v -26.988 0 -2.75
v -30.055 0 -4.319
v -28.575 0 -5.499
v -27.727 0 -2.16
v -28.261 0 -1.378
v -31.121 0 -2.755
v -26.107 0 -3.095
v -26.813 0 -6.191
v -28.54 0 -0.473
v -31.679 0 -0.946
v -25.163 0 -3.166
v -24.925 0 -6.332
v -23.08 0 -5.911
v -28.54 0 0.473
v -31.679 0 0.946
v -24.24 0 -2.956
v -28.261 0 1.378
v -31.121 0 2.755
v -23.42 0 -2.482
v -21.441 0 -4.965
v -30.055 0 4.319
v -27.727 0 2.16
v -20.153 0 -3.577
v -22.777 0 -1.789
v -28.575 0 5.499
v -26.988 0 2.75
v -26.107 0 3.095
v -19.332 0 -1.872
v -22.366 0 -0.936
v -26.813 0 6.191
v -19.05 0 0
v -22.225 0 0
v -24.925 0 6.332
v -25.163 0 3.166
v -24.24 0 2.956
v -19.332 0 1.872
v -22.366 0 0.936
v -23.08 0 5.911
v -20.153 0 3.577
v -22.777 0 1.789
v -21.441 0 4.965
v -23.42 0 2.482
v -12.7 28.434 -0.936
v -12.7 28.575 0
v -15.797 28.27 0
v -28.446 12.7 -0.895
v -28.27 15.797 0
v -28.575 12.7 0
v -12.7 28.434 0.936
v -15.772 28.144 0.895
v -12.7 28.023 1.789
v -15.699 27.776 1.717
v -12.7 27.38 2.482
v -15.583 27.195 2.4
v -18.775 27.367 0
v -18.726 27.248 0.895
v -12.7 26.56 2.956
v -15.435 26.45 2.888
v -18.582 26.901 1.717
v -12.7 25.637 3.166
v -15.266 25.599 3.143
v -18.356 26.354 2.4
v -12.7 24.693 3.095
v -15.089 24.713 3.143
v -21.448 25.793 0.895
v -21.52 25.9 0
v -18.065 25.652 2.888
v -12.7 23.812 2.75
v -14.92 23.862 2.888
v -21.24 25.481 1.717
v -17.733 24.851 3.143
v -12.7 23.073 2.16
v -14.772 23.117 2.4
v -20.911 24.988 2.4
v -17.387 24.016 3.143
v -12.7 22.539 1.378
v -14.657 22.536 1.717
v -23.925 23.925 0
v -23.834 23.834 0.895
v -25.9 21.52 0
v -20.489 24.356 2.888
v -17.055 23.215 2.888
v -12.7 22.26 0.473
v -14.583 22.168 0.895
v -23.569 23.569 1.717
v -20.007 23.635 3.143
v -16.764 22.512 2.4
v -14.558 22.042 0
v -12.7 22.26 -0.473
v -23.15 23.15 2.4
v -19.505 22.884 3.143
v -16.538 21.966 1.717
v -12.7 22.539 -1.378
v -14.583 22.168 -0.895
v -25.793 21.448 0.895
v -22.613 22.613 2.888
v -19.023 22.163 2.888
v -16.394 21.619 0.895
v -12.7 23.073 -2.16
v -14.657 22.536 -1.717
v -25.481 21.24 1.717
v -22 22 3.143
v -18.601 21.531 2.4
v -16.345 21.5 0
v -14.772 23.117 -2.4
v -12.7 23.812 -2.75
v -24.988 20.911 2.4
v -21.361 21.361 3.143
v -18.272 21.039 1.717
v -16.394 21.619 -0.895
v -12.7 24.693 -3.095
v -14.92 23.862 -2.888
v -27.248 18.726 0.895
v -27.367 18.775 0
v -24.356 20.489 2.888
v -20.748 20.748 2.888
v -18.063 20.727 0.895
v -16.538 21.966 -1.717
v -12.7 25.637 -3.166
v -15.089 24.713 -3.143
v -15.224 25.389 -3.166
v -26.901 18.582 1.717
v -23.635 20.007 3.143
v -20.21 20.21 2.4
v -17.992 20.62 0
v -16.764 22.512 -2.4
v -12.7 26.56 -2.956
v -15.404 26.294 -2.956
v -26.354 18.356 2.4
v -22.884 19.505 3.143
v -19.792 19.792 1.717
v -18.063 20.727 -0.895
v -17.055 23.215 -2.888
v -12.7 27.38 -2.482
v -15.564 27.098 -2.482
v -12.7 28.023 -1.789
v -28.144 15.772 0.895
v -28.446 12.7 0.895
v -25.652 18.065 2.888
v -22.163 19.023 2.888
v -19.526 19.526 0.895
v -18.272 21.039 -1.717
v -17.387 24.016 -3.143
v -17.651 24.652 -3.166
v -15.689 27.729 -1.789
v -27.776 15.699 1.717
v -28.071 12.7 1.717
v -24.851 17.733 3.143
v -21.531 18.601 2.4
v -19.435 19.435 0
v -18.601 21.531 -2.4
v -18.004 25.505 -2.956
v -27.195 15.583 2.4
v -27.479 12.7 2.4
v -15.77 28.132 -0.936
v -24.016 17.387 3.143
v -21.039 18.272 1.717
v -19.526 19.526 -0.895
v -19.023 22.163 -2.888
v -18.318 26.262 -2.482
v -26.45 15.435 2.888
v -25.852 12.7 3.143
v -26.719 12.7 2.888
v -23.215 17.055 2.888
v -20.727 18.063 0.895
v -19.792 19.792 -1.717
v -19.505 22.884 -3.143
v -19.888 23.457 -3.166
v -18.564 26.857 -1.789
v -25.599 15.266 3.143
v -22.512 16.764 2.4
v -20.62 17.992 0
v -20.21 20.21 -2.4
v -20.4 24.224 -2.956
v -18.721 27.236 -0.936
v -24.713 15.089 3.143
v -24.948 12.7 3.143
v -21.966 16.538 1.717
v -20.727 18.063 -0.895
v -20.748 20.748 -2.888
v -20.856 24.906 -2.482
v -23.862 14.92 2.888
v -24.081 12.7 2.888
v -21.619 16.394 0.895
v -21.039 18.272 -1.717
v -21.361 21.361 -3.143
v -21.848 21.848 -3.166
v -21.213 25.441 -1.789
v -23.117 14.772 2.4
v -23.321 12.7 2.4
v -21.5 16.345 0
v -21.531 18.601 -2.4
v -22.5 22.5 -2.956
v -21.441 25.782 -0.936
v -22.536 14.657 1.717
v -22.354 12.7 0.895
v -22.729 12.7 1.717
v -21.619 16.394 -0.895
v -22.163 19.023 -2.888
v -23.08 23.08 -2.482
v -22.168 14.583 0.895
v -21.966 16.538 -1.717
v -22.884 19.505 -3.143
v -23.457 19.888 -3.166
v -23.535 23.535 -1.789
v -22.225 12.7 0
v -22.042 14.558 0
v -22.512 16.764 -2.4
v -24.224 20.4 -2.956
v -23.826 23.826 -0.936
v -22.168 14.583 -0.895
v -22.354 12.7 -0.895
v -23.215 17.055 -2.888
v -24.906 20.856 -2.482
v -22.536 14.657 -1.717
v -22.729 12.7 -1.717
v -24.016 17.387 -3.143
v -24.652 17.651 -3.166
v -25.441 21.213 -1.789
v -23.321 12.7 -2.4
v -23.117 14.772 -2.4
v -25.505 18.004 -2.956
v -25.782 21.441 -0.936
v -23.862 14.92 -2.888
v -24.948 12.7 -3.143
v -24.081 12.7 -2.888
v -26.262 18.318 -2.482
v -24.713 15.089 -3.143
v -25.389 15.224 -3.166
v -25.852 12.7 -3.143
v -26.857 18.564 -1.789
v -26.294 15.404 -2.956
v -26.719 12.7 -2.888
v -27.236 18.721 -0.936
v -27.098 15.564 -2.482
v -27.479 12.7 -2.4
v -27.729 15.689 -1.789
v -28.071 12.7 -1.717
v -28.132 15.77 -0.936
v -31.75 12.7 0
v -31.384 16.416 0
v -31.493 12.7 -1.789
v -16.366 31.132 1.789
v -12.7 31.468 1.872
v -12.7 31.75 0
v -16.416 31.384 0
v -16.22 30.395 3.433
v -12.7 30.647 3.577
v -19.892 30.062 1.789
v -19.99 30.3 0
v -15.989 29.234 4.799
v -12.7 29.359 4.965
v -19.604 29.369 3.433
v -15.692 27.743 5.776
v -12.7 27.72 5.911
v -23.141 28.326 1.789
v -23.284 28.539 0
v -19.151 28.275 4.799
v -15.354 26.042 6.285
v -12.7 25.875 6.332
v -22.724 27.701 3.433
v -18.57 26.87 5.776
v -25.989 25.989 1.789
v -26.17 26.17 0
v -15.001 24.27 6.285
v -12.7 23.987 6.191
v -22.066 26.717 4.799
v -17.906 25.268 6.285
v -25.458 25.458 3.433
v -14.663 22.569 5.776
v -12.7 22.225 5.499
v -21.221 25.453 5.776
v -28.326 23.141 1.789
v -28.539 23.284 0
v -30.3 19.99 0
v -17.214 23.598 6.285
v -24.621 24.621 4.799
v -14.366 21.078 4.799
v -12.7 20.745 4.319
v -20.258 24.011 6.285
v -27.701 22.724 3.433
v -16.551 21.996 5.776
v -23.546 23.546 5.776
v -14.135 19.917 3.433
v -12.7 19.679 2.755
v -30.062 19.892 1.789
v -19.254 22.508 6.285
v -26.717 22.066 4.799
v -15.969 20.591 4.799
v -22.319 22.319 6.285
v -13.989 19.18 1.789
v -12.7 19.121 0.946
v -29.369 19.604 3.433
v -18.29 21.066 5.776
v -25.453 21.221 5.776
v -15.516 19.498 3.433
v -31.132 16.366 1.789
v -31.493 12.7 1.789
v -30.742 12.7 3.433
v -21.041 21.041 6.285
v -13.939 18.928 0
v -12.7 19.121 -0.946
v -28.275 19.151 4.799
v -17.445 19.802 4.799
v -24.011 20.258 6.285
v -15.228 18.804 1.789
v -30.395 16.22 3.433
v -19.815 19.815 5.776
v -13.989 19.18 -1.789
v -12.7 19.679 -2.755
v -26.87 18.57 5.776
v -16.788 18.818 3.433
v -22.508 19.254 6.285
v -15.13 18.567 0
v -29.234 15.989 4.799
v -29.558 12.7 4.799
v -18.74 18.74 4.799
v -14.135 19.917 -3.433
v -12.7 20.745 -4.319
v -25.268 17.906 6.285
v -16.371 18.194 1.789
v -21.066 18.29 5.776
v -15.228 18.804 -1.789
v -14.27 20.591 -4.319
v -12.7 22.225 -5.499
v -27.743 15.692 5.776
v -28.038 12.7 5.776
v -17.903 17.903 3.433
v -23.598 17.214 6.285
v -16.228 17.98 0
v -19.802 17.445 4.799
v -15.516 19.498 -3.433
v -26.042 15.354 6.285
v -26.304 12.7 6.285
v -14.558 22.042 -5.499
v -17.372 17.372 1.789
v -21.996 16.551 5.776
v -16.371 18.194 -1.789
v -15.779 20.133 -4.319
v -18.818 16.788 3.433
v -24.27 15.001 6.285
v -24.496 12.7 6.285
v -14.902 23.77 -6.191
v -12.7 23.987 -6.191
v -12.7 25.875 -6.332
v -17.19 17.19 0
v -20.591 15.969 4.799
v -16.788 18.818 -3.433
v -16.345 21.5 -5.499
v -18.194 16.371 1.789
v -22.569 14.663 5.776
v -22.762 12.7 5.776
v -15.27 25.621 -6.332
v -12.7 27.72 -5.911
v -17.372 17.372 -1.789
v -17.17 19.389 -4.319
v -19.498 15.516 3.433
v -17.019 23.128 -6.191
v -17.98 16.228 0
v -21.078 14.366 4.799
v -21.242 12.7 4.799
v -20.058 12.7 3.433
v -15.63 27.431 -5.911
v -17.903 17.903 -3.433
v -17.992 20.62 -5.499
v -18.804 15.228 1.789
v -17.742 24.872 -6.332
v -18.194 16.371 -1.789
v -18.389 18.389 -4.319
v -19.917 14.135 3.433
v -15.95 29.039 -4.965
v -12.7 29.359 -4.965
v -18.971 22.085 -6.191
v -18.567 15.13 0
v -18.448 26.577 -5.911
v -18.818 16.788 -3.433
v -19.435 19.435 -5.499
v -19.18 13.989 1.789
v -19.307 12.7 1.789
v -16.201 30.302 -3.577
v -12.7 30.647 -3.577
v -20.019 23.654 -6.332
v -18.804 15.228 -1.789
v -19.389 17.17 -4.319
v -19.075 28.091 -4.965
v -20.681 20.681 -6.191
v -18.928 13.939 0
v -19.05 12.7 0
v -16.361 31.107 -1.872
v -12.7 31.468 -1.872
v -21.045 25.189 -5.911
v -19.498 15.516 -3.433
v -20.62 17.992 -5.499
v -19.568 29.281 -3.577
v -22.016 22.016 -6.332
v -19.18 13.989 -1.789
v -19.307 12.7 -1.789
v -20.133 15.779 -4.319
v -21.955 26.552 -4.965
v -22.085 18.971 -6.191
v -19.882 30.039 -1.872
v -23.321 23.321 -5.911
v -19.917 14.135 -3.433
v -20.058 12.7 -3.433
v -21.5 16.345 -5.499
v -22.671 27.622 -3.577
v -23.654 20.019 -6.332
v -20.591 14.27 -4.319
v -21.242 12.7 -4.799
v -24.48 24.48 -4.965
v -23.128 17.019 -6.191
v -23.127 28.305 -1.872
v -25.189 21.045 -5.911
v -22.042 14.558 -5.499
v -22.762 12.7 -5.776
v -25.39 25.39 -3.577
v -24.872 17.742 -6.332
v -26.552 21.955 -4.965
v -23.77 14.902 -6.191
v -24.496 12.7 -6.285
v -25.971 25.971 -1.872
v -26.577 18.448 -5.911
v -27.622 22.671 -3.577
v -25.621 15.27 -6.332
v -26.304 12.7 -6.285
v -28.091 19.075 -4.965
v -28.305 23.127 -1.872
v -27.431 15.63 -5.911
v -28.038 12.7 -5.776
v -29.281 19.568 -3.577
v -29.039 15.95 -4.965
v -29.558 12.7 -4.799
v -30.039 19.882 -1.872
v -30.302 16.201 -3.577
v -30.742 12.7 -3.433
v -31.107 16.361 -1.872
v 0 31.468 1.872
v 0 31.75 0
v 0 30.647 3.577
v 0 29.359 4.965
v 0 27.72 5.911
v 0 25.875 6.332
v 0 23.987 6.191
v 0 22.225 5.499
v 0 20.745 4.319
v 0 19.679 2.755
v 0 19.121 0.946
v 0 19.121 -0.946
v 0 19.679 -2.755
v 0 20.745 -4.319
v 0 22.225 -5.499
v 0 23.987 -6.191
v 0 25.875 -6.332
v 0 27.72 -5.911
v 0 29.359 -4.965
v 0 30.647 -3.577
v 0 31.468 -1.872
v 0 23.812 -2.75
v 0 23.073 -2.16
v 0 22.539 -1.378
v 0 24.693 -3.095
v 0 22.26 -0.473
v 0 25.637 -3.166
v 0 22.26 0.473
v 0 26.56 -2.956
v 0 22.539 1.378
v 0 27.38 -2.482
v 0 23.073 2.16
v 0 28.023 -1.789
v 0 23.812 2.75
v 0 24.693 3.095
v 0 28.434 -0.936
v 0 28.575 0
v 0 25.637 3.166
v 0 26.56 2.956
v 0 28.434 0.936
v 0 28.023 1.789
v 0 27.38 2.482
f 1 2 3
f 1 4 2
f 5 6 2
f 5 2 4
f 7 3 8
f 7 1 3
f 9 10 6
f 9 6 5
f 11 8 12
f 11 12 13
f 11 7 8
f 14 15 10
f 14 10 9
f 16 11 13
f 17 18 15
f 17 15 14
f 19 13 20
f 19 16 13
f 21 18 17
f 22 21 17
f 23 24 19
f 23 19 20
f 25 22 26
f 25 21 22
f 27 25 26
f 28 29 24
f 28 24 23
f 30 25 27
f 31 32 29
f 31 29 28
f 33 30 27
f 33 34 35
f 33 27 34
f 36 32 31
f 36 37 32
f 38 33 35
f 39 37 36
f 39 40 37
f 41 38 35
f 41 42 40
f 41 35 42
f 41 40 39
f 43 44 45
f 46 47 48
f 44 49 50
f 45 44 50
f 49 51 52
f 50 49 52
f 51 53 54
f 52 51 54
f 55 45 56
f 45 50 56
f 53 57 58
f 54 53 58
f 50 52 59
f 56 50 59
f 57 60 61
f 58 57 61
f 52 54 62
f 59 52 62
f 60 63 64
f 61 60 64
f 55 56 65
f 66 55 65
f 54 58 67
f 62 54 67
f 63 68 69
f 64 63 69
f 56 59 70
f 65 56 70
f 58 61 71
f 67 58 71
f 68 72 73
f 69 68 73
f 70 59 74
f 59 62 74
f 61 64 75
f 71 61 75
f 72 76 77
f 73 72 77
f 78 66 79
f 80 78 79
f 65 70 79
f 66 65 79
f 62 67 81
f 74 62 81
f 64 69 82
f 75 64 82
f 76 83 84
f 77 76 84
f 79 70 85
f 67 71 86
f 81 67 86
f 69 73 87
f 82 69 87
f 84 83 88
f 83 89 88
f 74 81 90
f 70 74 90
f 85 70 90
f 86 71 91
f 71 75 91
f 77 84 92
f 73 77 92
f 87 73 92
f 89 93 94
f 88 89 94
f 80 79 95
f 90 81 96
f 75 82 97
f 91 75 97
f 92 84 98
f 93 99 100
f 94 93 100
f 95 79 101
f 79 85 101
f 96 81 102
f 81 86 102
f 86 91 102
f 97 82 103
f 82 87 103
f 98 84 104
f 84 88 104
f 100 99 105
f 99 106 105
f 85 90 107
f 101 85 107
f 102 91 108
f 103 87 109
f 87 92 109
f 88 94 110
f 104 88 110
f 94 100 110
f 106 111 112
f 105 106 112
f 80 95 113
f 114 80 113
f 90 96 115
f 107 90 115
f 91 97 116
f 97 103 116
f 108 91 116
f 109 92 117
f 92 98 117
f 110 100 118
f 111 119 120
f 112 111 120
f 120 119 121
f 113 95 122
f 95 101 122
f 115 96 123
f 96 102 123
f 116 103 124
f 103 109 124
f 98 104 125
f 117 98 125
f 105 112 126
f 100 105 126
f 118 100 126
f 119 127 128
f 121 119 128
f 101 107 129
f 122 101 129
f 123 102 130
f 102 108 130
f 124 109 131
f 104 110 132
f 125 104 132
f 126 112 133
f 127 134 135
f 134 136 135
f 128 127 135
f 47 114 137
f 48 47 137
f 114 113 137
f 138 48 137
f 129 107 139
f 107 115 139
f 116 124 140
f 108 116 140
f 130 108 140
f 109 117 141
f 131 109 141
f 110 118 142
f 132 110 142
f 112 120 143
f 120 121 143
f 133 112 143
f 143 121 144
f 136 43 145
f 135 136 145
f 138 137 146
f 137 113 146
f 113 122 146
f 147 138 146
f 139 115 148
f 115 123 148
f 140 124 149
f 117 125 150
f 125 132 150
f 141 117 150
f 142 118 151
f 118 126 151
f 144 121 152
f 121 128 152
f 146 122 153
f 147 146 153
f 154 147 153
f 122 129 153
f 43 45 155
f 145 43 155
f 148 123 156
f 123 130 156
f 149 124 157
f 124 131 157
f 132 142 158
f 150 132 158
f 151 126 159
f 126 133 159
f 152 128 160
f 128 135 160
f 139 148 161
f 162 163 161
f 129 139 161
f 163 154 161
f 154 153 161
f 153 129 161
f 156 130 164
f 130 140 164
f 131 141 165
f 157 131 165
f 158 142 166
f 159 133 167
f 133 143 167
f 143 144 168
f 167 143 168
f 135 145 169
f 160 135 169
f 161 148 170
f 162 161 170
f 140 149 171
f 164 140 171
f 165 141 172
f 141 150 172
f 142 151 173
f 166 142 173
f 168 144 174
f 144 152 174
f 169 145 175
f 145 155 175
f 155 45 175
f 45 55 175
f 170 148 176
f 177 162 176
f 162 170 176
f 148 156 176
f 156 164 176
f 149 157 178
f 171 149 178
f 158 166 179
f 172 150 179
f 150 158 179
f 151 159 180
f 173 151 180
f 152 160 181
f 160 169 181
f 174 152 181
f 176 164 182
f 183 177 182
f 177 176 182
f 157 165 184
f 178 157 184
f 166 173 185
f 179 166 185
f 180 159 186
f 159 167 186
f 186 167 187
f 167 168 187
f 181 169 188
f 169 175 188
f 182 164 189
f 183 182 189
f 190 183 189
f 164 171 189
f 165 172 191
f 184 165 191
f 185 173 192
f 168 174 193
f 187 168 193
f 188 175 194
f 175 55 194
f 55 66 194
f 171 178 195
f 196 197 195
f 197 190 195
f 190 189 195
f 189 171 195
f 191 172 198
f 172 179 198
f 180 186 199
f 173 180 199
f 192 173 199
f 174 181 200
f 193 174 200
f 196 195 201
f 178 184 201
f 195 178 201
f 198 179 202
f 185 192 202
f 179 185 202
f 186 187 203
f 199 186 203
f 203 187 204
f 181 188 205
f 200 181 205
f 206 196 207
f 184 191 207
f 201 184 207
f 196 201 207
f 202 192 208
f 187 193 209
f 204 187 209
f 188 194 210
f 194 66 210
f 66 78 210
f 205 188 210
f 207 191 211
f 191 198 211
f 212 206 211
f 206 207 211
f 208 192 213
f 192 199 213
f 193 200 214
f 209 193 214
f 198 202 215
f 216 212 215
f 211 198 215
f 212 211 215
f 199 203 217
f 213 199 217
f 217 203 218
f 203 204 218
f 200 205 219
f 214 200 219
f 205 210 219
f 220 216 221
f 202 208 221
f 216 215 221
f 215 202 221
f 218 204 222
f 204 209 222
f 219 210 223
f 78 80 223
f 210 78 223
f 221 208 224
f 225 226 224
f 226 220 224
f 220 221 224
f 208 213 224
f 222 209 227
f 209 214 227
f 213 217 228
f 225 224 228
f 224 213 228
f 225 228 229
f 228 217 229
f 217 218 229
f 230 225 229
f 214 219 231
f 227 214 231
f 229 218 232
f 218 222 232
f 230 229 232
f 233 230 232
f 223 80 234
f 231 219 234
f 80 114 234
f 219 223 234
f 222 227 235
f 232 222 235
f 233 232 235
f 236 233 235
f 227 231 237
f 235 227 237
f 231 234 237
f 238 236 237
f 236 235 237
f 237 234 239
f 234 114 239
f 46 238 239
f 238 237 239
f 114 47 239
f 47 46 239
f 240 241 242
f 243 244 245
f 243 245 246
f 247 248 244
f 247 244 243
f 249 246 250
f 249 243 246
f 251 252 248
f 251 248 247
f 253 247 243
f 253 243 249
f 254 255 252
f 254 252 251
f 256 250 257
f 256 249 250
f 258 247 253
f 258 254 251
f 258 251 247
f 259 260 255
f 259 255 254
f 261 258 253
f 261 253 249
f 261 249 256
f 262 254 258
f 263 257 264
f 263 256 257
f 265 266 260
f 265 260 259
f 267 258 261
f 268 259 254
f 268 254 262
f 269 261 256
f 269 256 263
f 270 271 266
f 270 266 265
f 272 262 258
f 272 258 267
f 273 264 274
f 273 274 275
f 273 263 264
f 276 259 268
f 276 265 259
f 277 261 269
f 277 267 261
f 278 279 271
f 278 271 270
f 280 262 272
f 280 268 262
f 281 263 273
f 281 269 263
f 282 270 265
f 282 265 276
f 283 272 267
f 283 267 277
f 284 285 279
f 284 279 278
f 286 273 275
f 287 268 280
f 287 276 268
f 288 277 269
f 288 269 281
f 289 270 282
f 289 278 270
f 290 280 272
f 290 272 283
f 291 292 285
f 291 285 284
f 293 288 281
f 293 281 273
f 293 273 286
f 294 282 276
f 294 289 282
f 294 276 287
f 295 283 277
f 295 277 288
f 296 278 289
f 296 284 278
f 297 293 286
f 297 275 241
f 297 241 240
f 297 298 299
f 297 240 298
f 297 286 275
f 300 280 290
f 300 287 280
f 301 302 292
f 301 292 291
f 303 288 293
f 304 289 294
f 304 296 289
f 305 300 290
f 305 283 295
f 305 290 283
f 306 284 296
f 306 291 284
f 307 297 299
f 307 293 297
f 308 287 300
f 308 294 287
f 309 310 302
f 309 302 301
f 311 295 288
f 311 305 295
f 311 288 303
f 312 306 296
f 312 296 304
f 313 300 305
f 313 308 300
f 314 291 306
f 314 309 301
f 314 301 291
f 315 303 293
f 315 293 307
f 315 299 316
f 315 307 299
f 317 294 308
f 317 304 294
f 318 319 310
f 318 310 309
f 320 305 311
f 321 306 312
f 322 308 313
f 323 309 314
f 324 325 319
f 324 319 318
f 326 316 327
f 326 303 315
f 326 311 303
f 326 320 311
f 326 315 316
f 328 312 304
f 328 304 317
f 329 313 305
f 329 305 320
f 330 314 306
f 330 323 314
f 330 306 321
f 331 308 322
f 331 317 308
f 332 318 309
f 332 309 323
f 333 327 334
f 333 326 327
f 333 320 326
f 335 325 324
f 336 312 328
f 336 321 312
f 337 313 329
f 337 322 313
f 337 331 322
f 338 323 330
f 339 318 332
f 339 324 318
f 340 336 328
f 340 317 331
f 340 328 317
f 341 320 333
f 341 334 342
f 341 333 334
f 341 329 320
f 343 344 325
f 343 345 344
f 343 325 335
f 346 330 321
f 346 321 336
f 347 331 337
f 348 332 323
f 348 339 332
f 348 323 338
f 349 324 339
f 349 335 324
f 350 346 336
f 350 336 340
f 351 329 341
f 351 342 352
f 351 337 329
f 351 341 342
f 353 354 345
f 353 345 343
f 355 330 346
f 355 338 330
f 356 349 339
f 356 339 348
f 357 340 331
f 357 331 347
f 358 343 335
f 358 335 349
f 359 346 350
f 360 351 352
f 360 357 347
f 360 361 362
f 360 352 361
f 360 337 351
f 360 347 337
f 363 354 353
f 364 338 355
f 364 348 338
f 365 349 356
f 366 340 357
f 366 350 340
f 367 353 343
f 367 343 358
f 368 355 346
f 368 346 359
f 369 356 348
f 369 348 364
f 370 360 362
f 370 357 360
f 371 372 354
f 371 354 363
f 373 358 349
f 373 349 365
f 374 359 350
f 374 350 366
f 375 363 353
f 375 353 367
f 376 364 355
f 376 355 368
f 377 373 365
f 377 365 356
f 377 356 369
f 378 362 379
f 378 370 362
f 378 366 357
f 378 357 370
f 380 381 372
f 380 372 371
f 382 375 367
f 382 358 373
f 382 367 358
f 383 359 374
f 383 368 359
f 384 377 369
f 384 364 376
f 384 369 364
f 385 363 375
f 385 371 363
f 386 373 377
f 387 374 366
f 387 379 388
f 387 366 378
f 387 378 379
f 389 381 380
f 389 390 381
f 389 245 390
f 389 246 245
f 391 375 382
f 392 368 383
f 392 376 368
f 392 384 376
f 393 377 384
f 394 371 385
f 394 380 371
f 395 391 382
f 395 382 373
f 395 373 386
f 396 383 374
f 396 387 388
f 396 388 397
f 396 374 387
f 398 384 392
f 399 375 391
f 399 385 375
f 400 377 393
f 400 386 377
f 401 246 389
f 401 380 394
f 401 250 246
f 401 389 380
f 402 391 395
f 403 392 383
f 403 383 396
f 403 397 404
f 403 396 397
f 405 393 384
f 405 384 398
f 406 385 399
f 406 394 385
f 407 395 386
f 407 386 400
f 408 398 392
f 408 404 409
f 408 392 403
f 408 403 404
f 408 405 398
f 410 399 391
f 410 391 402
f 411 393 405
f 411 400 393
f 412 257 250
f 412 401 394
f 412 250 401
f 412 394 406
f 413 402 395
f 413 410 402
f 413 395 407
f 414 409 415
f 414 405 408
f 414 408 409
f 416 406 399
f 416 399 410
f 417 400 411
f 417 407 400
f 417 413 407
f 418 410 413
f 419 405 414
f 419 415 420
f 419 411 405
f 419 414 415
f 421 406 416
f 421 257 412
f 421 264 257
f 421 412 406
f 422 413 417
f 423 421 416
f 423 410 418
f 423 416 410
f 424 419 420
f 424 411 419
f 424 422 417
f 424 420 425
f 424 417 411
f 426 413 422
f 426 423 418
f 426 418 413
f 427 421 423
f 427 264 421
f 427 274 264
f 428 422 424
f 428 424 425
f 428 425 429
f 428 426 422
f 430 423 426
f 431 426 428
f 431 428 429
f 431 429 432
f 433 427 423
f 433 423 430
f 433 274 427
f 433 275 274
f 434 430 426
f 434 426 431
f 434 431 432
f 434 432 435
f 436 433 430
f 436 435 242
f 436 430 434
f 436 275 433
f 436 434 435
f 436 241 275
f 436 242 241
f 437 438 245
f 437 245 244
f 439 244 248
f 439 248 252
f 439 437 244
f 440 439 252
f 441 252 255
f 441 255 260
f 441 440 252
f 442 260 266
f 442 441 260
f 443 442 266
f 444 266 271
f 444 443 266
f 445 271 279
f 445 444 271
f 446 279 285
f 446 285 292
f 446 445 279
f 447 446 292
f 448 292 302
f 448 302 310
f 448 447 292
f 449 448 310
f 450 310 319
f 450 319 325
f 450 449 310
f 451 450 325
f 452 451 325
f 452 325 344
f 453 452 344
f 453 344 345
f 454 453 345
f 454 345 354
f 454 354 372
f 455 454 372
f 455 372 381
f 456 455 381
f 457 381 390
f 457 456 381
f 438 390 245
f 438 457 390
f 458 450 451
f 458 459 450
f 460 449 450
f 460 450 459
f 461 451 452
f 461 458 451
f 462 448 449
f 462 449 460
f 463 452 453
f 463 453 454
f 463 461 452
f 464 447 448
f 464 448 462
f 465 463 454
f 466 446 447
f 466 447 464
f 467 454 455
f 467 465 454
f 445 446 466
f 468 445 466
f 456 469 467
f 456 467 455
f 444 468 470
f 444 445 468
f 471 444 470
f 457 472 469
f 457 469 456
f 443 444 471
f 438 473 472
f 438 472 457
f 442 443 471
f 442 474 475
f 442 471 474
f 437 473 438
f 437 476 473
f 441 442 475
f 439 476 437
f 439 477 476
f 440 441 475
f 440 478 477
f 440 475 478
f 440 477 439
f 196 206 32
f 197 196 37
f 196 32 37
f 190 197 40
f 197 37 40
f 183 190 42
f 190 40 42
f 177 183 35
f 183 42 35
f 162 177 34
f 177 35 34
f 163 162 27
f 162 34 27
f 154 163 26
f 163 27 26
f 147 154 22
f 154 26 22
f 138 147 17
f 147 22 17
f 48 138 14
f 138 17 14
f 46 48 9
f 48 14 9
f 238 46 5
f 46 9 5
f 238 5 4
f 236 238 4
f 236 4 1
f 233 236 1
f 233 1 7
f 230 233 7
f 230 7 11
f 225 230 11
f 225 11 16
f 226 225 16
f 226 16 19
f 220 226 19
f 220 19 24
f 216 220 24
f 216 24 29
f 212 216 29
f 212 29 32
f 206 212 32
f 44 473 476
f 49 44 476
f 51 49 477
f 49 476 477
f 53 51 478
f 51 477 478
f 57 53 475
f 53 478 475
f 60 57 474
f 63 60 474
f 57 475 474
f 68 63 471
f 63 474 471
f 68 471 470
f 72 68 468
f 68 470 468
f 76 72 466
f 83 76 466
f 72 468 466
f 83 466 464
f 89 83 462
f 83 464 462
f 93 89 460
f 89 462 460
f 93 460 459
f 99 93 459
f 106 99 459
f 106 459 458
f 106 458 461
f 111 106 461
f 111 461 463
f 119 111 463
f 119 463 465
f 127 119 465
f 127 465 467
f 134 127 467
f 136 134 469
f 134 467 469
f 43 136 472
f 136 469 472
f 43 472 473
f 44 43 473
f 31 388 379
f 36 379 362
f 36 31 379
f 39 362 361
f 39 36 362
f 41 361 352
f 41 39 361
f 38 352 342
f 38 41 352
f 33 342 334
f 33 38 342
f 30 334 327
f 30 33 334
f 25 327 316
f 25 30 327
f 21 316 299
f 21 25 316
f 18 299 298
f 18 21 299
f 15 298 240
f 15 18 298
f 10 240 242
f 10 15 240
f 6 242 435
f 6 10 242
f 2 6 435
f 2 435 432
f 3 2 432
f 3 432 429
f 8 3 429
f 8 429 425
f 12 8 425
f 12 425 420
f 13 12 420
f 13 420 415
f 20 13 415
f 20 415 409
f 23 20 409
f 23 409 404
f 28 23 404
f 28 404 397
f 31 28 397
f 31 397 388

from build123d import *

# Parameters (mm, degrees)
F0_R        = 6.35
F0_R_2      = 3.175
F1_DEPTH    = 12.7
F2_R        = 6.35
F2_R_2      = 3.175
F3_DEPTH    = 12.7
F1_FACE_R   = 6.35
F1_FACE_R_2 = 3.175


with BuildPart() as f1:
    # F0 (on Right) → F1 (new body)
    with BuildSketch(Plane.YZ):
        with Locations((25.4, 0)):
            Circle(F0_R)
        with Locations((25.4, 0)):
            Circle(F0_R_2, mode=Mode.SUBTRACT)
    extrude(amount=-F1_DEPTH)



with BuildPart() as f3:
    # F2 (on Front) → F3 (new body)
    with BuildSketch(Plane.XZ):
        with Locations((-25.4, 0)):
            Circle(F2_R)
        with Locations((-25.4, 0)):
            Circle(F2_R_2, mode=Mode.SUBTRACT)
    extrude(amount=-F3_DEPTH)


with BuildPart() as f1_1:
    add(f1.part)

    add(f3.part)  # F5 merges F3
    # F5: sweep along a path in F4
    with BuildLine(Plane.XY) as f5_path:
        ThreePointArc((-12.7, 38.1), (-30.6605122421, 30.6605122421), (-38.1, 12.7))
    # F1_face (on face) → F5 (sweep)
    with BuildSketch(Plane(origin=(-12.7, 25.4, 0), x_dir=(0, 1, 0), z_dir=(-1, 0, 0))):
        Circle(F1_FACE_R)
        Circle(F1_FACE_R_2, mode=Mode.SUBTRACT)
    sweep(path=f5_path.line)


solid = f1_1.part
